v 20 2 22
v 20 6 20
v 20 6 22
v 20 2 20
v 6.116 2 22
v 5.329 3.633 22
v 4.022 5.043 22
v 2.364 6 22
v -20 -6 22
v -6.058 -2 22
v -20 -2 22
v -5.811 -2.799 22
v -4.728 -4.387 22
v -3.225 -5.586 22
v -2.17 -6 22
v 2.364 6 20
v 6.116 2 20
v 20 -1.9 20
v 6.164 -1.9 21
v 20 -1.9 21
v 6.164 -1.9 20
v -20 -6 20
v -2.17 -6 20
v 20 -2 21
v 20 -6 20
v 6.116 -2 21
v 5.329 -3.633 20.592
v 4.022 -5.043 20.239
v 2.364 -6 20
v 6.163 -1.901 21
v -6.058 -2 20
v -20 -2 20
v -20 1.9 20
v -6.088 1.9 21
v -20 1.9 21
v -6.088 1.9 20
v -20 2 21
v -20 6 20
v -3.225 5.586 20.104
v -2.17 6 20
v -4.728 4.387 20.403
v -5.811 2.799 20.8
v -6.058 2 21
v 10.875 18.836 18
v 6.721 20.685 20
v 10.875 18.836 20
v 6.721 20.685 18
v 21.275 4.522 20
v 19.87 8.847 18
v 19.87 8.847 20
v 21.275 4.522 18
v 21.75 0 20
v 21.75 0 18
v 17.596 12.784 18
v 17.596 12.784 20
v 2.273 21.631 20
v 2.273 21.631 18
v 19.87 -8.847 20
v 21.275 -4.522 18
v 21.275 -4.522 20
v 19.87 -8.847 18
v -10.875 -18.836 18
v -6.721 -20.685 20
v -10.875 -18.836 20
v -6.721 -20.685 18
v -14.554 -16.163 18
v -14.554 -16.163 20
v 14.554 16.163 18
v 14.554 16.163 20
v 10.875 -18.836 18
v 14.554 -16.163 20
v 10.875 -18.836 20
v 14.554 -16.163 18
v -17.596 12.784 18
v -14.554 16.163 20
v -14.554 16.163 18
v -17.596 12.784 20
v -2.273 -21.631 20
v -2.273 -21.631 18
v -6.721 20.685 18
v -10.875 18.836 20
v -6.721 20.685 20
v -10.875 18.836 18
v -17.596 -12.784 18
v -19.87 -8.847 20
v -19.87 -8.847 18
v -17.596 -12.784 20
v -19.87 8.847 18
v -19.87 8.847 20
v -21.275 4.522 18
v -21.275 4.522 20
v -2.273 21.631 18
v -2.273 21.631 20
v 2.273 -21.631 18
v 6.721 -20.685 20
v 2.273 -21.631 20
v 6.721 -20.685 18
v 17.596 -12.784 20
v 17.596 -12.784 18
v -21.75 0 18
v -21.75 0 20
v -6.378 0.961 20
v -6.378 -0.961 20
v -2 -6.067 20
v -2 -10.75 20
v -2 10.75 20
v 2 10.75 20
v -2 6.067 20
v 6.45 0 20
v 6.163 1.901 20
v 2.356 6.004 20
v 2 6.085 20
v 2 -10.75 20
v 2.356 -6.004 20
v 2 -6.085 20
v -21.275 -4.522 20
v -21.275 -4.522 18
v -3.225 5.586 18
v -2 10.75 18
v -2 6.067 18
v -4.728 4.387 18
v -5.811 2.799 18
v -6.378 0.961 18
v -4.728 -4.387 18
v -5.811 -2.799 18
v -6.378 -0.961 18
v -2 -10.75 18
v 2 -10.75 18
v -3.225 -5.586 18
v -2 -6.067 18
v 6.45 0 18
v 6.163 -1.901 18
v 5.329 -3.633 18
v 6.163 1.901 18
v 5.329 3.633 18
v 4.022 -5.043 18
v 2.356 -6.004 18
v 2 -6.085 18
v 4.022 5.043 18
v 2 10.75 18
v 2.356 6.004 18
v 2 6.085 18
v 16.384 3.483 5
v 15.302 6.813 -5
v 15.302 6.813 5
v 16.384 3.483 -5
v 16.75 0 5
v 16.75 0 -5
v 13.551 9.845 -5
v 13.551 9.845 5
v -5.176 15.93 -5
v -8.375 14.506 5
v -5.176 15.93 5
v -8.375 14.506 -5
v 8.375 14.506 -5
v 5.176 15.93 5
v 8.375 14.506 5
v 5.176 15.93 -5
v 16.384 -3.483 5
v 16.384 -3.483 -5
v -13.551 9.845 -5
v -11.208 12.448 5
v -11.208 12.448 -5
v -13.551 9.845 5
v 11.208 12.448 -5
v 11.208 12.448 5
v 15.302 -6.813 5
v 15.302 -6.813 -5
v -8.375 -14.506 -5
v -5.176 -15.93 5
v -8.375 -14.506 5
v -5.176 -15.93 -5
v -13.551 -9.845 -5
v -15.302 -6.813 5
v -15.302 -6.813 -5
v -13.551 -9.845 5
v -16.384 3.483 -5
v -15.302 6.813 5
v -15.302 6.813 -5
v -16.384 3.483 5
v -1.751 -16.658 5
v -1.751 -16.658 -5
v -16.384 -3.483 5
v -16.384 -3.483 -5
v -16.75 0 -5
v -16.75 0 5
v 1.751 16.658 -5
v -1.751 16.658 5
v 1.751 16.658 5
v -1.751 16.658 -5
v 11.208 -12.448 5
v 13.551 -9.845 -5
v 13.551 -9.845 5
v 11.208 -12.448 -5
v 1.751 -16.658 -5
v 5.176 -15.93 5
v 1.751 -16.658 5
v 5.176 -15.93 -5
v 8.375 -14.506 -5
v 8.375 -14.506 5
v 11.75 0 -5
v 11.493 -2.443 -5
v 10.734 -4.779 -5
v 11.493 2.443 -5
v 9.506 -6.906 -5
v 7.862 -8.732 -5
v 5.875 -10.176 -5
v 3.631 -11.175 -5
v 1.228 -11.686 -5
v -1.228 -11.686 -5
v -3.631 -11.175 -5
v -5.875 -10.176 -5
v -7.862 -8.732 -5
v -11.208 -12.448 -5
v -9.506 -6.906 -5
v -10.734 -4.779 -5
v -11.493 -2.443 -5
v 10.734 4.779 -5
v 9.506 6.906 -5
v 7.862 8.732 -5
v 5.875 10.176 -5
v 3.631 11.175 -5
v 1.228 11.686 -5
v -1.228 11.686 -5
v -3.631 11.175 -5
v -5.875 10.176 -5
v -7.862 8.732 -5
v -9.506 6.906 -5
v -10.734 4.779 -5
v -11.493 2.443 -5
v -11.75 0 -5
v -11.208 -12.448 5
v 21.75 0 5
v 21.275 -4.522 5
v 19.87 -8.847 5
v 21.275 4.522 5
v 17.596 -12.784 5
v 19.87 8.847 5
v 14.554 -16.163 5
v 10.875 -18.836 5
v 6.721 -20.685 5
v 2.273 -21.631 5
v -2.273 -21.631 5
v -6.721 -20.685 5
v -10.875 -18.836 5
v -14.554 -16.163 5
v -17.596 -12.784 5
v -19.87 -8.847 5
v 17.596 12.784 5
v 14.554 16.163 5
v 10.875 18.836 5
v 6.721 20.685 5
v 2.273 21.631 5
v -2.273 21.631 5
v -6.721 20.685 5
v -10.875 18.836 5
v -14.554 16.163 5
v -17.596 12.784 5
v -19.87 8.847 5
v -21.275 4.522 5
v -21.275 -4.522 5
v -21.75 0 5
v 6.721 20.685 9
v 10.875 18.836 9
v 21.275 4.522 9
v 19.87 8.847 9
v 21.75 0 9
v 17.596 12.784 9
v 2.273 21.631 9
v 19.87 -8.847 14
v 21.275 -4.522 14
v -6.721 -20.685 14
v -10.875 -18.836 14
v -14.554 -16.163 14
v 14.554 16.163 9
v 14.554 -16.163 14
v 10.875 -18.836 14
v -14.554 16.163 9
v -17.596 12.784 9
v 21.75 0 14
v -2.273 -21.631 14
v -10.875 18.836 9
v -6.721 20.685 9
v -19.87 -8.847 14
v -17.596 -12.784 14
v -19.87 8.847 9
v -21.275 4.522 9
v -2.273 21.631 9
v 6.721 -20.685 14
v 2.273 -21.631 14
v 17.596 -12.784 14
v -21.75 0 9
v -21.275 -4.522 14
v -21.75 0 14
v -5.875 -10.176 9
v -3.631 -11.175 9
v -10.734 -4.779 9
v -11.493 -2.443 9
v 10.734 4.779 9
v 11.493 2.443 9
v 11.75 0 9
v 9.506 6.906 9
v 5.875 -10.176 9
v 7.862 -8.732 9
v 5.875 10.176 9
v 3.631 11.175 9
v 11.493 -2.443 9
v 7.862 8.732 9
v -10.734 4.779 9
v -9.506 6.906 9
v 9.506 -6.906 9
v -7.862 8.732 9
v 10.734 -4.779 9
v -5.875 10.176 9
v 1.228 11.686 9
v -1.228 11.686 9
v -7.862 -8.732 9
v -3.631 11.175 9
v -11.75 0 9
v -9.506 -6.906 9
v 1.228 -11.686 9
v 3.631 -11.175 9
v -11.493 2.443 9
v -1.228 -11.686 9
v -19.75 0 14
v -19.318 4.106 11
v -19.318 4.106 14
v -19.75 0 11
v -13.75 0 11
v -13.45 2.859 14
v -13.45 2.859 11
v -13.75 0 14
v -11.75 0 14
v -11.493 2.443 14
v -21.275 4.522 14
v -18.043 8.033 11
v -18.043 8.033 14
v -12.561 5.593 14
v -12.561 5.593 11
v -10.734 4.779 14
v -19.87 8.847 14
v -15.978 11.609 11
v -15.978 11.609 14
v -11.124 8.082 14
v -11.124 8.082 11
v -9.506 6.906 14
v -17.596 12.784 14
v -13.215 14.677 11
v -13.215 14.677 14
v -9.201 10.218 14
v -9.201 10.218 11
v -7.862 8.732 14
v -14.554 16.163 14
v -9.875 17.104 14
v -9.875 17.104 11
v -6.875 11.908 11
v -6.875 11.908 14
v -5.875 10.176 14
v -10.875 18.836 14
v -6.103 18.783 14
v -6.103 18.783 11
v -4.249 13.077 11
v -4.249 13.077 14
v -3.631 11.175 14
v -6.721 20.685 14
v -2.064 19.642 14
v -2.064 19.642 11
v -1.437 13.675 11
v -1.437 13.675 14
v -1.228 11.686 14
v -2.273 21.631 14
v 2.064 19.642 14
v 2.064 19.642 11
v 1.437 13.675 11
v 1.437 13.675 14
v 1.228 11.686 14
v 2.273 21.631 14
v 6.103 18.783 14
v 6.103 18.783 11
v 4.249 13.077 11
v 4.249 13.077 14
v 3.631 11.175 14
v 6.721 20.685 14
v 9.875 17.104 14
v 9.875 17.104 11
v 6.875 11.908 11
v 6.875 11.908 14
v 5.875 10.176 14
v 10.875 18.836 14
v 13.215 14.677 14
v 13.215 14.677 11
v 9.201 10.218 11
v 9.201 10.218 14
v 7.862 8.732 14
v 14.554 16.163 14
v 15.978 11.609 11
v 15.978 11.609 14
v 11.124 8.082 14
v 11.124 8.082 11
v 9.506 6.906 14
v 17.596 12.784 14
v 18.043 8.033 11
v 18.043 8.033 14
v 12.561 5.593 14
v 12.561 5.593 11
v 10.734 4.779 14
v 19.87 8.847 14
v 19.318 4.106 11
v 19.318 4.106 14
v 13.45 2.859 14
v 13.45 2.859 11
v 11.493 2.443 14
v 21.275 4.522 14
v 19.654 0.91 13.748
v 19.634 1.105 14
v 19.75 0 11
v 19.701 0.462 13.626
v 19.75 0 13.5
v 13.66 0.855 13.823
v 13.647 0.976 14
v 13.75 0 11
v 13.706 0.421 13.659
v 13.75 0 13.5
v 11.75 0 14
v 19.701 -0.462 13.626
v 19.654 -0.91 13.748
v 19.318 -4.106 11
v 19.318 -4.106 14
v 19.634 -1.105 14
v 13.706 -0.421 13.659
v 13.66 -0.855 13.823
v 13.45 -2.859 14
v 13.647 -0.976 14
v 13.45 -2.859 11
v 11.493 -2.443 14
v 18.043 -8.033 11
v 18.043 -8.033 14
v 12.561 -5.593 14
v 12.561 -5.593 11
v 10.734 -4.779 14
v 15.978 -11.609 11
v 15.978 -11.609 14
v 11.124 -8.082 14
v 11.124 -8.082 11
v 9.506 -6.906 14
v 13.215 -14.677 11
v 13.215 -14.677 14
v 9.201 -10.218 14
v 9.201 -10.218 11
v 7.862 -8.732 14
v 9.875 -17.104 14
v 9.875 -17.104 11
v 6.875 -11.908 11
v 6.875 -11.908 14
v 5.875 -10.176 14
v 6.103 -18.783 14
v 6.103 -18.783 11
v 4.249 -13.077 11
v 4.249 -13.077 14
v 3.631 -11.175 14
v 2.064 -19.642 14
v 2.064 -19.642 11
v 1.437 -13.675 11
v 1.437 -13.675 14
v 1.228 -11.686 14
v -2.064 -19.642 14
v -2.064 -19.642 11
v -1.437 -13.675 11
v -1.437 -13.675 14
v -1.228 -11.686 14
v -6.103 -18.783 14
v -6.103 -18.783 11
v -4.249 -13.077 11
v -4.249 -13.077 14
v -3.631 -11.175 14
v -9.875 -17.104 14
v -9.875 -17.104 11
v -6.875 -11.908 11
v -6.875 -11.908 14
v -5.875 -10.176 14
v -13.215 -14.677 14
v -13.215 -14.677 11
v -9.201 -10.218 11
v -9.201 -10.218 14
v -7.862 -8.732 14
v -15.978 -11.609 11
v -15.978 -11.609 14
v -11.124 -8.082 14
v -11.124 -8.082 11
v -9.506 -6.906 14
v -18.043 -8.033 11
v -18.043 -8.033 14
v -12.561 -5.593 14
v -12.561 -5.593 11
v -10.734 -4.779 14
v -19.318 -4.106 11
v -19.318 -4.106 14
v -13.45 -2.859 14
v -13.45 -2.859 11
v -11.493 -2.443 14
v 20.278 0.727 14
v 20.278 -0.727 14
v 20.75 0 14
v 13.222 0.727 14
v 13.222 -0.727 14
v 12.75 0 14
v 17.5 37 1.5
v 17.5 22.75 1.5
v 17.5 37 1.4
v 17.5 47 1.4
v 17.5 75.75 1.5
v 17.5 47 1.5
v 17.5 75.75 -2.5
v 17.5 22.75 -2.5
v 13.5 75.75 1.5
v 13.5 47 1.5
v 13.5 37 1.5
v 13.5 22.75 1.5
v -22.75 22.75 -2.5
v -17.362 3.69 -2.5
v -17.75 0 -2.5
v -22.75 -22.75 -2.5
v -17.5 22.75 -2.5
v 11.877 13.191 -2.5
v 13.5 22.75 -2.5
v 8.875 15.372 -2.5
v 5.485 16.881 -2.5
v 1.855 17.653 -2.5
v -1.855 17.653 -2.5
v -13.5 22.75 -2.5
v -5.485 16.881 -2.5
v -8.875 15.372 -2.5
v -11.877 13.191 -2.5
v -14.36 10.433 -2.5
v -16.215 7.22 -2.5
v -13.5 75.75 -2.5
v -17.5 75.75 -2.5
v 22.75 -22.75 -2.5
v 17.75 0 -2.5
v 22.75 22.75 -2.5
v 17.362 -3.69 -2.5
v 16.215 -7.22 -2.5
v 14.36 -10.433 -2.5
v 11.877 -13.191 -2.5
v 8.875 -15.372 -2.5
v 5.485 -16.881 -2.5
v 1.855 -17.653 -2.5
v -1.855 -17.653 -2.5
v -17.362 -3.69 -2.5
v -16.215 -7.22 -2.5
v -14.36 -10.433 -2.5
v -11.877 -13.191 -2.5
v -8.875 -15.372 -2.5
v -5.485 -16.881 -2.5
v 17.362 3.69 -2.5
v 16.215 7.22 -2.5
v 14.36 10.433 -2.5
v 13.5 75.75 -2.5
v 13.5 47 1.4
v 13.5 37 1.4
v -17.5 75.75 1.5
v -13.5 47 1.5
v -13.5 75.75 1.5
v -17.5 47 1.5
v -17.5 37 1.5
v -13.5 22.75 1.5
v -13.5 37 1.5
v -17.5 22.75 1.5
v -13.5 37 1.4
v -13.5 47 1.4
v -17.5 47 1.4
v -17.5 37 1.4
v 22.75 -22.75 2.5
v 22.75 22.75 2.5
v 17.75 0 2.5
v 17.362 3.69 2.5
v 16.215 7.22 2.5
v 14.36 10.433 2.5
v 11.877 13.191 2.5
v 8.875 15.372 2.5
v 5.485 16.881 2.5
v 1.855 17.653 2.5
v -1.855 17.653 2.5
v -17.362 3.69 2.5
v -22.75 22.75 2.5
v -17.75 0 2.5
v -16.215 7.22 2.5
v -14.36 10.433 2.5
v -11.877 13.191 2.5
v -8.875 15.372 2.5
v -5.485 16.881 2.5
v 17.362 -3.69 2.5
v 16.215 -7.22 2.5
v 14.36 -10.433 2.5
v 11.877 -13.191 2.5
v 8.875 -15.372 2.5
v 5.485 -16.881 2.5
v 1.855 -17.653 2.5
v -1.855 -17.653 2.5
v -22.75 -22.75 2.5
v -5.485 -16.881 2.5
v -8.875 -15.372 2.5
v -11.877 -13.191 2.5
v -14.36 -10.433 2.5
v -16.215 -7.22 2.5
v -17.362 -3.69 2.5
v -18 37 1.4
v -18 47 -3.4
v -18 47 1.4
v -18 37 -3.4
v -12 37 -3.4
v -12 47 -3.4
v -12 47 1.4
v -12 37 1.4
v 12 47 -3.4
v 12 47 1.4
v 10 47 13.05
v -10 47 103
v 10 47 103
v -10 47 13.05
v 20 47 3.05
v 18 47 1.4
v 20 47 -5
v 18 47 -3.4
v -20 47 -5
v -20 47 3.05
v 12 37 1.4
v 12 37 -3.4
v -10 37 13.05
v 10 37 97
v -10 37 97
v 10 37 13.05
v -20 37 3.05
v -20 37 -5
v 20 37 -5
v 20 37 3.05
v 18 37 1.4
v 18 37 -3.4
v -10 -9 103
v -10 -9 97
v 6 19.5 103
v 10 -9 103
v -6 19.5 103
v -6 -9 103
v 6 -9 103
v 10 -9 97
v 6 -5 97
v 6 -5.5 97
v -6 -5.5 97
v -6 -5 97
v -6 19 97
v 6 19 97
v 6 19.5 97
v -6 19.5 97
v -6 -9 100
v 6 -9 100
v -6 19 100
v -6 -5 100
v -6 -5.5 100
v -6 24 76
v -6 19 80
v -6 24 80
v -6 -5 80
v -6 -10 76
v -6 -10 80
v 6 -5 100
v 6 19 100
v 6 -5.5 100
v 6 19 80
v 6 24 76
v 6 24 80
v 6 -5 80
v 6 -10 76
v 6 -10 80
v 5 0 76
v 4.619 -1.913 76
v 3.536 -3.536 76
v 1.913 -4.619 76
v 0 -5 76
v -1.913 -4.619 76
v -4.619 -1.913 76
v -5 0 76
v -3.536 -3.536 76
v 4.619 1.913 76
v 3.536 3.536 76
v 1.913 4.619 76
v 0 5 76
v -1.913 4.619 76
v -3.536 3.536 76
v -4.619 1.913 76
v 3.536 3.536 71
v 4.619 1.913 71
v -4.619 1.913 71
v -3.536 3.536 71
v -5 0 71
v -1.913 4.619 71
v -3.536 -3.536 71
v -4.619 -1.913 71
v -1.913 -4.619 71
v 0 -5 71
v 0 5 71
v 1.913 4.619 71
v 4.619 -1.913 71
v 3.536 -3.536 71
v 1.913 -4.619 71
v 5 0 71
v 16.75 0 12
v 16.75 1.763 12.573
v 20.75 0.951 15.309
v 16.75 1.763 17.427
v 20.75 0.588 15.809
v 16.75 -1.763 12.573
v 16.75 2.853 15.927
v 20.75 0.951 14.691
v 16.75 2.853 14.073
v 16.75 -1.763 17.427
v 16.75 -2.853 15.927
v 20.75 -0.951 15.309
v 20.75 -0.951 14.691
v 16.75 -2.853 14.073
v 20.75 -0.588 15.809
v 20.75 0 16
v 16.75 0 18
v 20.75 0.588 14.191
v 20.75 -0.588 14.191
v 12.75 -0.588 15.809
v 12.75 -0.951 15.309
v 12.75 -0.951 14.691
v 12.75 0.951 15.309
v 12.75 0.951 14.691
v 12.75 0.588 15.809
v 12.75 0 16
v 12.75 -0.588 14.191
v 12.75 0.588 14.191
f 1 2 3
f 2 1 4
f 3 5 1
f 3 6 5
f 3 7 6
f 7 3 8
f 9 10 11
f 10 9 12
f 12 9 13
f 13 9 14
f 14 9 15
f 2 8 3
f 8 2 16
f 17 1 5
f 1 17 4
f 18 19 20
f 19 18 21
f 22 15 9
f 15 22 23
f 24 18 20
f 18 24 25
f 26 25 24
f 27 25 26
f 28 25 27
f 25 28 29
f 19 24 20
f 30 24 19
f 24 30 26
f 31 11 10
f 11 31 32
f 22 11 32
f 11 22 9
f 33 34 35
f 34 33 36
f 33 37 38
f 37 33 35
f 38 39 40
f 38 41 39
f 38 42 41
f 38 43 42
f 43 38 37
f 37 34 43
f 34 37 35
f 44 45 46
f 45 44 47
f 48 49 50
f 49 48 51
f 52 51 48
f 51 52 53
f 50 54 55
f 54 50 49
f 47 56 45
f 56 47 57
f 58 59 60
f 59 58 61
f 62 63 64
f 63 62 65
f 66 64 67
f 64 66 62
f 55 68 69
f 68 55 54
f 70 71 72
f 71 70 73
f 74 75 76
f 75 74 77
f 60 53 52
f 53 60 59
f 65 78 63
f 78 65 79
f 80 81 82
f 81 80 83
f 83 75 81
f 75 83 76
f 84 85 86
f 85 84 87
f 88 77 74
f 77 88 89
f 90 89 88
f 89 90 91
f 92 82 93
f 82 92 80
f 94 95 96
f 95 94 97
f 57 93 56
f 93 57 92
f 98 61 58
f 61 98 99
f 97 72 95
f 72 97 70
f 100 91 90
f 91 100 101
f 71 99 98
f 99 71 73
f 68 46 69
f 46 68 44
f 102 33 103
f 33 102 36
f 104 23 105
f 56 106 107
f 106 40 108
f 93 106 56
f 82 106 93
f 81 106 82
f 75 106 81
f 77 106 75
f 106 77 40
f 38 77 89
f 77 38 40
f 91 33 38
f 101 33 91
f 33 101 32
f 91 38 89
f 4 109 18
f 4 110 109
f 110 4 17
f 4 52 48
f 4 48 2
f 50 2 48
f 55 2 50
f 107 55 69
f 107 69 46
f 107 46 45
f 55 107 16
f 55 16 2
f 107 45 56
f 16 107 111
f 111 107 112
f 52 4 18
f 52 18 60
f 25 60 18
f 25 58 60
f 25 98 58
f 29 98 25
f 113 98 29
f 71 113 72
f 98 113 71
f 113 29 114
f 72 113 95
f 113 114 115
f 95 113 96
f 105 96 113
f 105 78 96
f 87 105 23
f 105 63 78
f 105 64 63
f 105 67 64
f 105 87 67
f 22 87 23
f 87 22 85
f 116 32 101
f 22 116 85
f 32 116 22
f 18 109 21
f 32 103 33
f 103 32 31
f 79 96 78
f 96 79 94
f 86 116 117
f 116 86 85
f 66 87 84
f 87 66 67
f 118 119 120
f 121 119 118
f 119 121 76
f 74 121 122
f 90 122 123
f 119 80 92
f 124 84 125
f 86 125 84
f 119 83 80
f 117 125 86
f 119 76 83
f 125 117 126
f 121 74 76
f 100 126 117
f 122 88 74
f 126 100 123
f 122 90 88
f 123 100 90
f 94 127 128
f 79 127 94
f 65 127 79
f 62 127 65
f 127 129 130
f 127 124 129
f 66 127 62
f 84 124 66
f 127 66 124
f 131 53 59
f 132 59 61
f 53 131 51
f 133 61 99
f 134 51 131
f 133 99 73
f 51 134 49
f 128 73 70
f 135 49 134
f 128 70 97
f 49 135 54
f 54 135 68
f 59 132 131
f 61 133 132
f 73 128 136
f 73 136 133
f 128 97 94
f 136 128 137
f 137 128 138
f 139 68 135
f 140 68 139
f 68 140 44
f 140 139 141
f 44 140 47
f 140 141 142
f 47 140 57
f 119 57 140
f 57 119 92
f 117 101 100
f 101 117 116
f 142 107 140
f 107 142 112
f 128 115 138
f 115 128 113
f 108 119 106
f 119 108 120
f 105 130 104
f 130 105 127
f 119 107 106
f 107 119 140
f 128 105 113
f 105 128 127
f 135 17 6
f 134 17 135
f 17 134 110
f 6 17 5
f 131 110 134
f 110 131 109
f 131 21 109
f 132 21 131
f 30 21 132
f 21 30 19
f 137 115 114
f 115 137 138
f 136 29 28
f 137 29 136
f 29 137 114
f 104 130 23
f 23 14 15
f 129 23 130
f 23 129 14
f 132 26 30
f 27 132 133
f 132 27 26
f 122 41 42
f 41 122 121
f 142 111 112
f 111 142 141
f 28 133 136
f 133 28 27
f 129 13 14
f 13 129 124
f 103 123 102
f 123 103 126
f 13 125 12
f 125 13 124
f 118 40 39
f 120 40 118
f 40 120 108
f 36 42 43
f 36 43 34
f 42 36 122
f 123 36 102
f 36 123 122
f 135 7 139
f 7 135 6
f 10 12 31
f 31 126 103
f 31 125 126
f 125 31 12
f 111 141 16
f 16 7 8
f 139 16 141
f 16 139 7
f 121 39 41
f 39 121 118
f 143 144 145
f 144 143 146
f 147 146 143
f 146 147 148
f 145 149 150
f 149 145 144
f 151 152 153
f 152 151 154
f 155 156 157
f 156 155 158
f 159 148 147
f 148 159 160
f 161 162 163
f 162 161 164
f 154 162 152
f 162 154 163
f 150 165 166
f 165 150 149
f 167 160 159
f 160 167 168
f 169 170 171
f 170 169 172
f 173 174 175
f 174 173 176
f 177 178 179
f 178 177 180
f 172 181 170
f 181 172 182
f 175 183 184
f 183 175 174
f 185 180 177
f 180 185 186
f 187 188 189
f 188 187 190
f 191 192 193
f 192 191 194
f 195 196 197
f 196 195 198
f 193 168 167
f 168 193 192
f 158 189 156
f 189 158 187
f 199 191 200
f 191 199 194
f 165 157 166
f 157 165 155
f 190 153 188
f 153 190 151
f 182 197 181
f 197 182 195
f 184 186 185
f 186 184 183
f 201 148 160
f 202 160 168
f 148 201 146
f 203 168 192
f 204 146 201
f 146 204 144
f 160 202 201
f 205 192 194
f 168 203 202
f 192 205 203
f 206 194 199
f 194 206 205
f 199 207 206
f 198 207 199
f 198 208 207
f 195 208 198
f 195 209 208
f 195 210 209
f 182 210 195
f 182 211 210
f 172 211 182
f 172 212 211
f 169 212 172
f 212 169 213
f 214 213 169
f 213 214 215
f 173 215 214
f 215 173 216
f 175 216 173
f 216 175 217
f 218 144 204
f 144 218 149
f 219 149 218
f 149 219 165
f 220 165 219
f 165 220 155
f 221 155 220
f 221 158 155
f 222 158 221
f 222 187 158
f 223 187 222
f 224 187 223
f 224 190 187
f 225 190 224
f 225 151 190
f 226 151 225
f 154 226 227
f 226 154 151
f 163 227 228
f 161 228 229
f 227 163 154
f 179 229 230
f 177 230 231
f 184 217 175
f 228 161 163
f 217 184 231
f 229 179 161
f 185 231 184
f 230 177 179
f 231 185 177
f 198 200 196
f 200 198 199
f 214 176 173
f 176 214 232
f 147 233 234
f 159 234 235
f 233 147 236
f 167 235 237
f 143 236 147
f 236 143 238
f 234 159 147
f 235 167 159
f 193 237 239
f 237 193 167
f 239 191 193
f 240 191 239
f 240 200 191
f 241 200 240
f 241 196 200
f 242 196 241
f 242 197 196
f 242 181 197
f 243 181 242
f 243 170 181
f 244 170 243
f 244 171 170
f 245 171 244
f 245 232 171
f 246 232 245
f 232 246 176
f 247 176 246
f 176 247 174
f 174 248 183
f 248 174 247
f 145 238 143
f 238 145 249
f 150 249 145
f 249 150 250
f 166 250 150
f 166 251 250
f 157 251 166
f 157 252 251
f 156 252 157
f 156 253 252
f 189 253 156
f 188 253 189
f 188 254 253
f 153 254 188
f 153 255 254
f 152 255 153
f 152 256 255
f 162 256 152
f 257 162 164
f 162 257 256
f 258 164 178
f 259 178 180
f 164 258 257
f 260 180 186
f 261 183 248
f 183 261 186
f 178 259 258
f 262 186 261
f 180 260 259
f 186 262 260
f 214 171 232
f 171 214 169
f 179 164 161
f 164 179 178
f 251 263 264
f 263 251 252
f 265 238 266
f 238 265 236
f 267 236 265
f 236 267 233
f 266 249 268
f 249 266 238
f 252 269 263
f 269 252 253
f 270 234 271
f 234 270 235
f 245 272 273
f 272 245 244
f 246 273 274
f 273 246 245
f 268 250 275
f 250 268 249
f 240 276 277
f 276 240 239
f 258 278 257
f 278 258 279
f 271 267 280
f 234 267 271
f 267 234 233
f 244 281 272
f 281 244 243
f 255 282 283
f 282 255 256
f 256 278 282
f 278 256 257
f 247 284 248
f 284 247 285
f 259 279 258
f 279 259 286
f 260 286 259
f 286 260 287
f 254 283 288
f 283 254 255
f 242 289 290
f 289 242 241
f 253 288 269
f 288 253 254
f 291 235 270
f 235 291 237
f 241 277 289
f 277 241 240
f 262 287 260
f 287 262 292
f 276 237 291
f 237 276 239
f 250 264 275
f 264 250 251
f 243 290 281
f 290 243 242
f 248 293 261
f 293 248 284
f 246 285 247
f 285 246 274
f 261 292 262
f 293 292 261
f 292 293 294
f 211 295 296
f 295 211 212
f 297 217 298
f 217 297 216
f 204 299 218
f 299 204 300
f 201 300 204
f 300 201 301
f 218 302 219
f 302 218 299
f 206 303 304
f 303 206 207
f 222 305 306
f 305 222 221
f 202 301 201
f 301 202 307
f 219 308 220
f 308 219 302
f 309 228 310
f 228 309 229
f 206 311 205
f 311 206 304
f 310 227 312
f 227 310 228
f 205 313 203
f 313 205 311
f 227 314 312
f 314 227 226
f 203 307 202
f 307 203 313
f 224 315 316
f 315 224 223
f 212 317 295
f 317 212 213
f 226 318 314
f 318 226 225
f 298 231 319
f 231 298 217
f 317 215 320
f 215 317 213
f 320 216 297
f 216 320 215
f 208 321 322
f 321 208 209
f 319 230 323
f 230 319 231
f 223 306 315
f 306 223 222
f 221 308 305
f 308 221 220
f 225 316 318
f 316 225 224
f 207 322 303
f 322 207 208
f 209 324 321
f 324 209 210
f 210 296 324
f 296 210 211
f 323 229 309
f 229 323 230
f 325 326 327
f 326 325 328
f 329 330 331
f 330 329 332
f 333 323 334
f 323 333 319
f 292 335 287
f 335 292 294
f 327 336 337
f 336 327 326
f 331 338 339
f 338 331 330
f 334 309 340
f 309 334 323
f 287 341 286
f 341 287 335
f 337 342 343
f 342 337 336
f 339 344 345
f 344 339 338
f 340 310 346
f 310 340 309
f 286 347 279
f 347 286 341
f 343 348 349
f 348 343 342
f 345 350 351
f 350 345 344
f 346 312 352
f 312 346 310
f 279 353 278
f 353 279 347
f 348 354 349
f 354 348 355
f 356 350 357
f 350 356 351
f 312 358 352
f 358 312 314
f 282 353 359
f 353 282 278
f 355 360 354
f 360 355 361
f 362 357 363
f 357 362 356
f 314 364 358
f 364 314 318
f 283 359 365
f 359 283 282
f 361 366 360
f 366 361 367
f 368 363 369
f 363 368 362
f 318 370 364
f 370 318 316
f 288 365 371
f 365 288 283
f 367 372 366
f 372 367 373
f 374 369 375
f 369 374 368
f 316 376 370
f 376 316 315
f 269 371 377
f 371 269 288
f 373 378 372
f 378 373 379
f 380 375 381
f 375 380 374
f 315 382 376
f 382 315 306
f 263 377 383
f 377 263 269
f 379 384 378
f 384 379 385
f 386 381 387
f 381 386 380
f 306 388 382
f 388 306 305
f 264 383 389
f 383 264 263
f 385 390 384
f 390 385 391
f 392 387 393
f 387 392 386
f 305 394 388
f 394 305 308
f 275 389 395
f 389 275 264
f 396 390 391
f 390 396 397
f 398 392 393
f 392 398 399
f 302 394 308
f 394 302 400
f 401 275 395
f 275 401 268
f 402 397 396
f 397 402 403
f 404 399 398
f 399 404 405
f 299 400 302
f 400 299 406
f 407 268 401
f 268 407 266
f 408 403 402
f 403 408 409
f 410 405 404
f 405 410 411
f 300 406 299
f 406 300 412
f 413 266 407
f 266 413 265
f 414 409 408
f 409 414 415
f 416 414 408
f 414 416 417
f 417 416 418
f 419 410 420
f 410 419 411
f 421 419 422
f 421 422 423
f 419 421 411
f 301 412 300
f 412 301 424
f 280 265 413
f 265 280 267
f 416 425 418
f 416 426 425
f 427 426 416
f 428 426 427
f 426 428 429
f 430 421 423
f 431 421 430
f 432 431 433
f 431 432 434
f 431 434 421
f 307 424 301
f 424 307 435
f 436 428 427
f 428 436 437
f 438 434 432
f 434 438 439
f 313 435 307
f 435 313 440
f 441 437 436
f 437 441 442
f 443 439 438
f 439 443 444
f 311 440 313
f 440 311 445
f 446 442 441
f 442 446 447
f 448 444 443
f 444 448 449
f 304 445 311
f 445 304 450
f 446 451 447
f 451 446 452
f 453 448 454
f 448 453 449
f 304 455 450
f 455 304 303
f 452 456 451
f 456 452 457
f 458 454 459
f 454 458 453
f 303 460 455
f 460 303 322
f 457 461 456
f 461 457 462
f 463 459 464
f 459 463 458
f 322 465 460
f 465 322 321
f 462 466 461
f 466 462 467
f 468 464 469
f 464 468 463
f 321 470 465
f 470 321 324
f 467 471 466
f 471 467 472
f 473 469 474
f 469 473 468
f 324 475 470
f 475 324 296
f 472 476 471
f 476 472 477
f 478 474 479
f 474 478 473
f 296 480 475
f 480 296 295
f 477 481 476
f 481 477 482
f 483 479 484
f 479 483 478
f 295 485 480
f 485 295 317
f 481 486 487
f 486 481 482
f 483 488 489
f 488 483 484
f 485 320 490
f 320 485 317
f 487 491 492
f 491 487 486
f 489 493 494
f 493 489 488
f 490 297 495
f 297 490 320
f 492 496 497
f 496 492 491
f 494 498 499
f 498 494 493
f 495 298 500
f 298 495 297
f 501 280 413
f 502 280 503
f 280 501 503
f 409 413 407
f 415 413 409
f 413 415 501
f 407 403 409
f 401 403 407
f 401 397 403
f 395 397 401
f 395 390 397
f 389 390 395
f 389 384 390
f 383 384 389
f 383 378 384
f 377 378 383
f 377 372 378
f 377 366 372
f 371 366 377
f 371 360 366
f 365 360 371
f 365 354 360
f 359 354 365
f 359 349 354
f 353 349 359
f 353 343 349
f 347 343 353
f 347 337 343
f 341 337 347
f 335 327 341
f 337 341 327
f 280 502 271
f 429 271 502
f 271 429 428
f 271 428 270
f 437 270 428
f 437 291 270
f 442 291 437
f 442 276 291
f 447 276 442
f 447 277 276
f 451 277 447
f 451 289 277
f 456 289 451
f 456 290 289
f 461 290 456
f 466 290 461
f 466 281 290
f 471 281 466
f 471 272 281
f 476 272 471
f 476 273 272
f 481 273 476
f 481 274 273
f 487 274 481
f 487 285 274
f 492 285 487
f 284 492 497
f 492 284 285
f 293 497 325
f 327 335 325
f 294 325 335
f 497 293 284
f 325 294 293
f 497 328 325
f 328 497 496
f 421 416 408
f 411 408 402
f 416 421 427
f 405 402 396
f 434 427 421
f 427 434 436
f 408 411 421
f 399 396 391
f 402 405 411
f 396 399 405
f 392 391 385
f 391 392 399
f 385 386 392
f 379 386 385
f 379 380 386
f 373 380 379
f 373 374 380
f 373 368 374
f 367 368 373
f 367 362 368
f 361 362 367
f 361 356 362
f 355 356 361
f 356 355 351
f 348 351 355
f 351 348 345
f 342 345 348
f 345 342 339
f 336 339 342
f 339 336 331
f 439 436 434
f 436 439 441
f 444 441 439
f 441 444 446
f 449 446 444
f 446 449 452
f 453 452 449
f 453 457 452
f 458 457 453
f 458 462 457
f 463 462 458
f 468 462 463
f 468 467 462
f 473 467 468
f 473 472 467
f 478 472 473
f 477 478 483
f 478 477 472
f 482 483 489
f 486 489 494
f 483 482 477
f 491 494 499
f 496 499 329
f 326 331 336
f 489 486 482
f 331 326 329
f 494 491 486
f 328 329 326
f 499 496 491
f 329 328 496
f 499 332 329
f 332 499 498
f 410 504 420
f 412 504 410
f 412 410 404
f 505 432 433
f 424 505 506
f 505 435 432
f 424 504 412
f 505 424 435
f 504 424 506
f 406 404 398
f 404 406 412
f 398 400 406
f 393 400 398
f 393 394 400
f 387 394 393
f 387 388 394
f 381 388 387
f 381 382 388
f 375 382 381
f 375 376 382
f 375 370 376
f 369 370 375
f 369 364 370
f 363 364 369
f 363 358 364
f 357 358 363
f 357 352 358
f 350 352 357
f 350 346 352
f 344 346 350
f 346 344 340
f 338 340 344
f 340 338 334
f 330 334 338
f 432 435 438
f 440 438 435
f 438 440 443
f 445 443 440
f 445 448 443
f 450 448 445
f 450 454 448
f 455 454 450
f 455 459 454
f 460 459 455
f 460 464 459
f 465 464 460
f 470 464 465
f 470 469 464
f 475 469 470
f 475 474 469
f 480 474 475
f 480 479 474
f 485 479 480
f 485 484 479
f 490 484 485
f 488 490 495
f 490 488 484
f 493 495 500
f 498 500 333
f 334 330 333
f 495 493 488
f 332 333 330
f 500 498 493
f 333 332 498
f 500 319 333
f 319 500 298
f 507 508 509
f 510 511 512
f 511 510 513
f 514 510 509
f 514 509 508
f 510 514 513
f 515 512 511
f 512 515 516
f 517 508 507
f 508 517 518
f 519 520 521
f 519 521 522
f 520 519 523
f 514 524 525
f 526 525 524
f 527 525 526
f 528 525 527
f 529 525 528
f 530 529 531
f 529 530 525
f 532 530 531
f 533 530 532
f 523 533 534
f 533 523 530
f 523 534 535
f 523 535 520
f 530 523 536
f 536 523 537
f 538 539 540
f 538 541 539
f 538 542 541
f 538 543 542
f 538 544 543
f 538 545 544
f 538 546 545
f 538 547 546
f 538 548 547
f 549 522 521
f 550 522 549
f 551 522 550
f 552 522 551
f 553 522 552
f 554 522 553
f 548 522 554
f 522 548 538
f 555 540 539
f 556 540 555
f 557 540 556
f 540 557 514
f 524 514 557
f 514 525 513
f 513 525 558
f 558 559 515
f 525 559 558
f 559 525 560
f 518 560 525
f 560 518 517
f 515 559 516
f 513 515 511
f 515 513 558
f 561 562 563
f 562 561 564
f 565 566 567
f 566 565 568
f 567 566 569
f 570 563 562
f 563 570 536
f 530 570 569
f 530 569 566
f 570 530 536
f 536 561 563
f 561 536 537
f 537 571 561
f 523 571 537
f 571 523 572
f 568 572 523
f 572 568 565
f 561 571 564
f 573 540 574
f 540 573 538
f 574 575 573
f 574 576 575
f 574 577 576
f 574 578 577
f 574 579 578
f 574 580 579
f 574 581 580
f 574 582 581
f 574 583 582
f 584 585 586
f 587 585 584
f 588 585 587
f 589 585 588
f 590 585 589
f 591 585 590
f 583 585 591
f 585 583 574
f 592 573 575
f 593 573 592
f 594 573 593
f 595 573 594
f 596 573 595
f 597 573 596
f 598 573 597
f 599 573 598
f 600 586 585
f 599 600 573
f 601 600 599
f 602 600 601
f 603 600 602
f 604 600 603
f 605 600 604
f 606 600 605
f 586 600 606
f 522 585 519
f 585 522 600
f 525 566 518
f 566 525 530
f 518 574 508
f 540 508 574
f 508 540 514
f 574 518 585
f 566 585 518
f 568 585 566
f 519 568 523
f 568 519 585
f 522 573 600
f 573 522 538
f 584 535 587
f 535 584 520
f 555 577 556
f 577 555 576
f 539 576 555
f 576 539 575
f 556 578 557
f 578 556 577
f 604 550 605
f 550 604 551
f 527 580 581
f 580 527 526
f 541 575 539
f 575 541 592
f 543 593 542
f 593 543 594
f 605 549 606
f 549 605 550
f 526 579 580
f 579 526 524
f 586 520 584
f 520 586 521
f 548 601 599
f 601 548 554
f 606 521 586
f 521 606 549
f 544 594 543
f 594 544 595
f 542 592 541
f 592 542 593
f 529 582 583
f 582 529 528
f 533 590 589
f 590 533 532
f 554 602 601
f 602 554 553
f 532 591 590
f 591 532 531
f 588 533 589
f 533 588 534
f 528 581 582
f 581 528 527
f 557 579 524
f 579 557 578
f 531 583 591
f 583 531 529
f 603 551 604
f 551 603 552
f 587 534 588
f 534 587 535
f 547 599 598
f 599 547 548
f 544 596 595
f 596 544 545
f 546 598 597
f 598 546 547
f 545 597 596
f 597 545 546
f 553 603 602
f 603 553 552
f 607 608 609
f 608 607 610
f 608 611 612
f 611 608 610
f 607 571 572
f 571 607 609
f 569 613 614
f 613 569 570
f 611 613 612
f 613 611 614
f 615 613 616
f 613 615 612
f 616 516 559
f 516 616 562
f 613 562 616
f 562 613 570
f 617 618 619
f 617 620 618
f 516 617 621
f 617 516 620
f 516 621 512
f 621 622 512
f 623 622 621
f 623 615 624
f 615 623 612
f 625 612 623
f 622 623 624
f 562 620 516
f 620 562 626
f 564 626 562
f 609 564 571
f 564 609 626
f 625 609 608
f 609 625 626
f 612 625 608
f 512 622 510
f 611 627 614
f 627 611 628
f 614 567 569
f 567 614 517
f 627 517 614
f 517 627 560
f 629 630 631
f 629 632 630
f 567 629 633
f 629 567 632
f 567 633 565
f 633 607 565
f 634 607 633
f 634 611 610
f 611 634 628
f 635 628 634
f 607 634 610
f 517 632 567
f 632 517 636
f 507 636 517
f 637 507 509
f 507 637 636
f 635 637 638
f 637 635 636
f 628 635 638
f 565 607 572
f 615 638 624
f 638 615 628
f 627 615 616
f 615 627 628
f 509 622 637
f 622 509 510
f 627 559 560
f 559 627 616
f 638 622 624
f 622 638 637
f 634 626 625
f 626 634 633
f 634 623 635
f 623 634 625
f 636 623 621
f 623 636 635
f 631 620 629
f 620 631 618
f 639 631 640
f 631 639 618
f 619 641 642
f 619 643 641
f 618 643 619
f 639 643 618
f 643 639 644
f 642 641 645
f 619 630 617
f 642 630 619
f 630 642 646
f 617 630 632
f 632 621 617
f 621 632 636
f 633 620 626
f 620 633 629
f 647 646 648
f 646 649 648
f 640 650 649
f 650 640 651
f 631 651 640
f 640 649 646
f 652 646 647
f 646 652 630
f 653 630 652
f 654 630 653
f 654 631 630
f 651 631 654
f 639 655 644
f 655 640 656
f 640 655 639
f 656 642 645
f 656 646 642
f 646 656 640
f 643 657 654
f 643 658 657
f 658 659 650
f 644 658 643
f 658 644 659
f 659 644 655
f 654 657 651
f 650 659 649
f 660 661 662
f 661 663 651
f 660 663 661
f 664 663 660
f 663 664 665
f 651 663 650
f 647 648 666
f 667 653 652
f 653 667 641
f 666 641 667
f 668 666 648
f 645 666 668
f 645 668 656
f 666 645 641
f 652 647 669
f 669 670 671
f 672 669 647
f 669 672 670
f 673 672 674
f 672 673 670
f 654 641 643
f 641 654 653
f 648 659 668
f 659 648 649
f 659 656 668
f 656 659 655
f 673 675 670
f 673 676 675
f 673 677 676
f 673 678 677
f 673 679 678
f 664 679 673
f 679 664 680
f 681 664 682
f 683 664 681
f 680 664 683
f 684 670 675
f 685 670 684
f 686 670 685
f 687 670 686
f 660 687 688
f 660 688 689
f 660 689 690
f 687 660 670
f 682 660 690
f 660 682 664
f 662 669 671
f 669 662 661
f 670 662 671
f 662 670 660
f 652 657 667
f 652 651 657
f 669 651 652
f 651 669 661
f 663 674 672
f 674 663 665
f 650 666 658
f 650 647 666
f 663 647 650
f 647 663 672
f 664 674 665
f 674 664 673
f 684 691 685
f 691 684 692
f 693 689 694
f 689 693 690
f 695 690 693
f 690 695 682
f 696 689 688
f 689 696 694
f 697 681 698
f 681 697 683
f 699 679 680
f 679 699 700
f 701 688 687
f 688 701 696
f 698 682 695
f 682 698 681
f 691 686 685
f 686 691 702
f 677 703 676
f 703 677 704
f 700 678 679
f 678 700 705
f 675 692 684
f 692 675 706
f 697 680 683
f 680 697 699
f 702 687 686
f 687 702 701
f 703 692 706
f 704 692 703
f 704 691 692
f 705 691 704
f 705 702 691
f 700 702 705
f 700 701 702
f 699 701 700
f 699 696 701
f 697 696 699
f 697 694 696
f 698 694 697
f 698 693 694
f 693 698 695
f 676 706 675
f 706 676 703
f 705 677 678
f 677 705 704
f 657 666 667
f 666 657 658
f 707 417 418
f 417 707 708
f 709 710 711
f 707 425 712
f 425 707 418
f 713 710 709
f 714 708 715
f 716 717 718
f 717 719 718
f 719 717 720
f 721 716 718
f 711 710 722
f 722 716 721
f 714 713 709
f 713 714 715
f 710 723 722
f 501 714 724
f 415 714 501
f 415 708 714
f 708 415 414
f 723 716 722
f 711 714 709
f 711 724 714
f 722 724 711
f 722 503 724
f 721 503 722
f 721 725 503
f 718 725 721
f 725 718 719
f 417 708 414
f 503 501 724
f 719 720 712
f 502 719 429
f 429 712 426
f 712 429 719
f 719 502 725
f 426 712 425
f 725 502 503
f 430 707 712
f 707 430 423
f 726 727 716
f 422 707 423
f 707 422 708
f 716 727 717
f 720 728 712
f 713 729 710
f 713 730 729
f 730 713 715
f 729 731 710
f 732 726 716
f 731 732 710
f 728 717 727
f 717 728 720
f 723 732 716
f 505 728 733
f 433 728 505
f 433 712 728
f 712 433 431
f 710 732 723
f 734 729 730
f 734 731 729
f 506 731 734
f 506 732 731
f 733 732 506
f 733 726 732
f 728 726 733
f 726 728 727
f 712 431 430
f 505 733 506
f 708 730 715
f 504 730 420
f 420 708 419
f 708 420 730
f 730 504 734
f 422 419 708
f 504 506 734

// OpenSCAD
// file: ball_bearing.scad
include <parameters.scad>

module ball_bearing(){
    rotate([0,90,0])
    cylinder(ball_bearing_length/2,ball_bearing_height ,true);
    rotate([0,90,180])
    cylinder(ball_bearing_length/2,ball_bearing_height ,true);
}

//%ball_bearing();
// file: servo.scad
//parameters
servo_width = 12;
servo_length = 24;
servo_height = 24;
ex_length = 5;
ex_height = 4;
shaft_radius = 5;
shaft_height = 5;
shaft_offset = -servo_length/2+shaft_radius;

module mirror_copy(vec=[0,1,0]){
    children();
    mirror(vec)children();
}

module back_holes(){
    mirror_copy([1,0,0])translate([top_component_width/2-round((top_component_width*0.1)/2)-3,0,0])
    cube([round(top_component_width*0.15),back_component_length,top_component_height*0.6], true);    
}

module servo(){
    translate([0,0,servo_height/2])
    union(){
        //extrusion
        mirror_copy()
            translate([0,servo_length/2+ex_length/2,(servo_height/2)-ex_height/2])
                cube([servo_width, ex_length, ex_height], true);
        //shaft
        translate([0,shaft_offset,servo_height/2+shaft_height/2])
        cylinder(shaft_height, shaft_radius, shaft_radius, true);
        //base
        cube([servo_width, servo_length, servo_height], true);
    }
}
// file: hangon_clickin.scad
include <servo.scad>
include <parameters.scad>

//%back_holes();

module hangon(){
    //support
    mirror_copy([1,0,0])translate([hangon_support_distance,-hangon_support_length/2-(contact_delta/2)+5,-(5-(top_component_height*0.5))/2])
    cube([round(top_component_width*0.1),hangon_support_length+contact_delta,top_component_height*0.5], true);

    //base
    translate([0,shaft_center,0])
    difference(){
        cube([hangon_base_diameter,hangon_base_diameter,5], true);
        cylinder(10, hangon_base_diameter/2-5, hangon_base_diameter/2-5, true);
    }
}
// file: base_clickin.scad
include <servo.scad>
include <parameters.scad>

module tower_base(){
    union(){
        //back tower
        union(){
            translate([0,back_offset,(back_component_height/2)-base_height/2])
            union(){
                //back holes
                translate([0,0,back_component_height/2+top_component_height/2])
                difference(){
                    cube([top_component_width,back_component_length,top_component_height], true);
                    back_holes();
                    
                }
                //back component
                cube([outer_width,back_component_length,back_component_height], true);
                //triangle supports
                hull(){
                    translate([0,0,back_component_height/2])
                    cube([top_component_width,back_component_length,0.1], true);
                    translate([0,0,back_component_height/2-10])
                    cube([outer_width,back_component_length,0.1], true);
                }
            }
        }
        //base
        difference(){
            difference(){
                cube([outer_width,outer_length,base_height], true);
                translate([0,-front_offset,0])
                cube([inner_width,inner_length,base_height], true);
            }
            translate([0,-outer_length/2+2,-2])
            cube([inner_width,4,4], true);
        }
    }
}

//tower_base();
//translate([0,-front_offset,0])
//  %servo();
// file: bearing_disc.scad
include <parameters.scad>
include <bearing_holder.scad>

/*
translate([0,-shaft_center,0])
bearing_holder();
*/

module bearing_disc(){
    translate([0, 0, holder_height+bearing_pit_height+disc_height/2])
    union(){
        difference(){
            union(){
                //lock high 1
                translate([0,hole_width/2,0])
                cube([20,4,disc_height+1]);
                //lock low 1
                hull(){
                    translate([0,-hole_width*1.5,0])
                    cube([20,0.1,disc_height-1]);
                    translate([0,-hole_width/2,0])
                    cube([20,0.1,disc_height]);
                }
                //lock high 2
                rotate([0,0,180])
                translate([0,hole_width/2,0])
                cube([20,4,disc_height+1]);
                //lock low 2
                rotate([0,0,180])
                hull(){
                    translate([0,-hole_width*1.5,0])
                    cube([20,0.1,disc_height-1]);
                    translate([0,-hole_width/2,0])
                    cube([20,0.1,disc_height]);
                }
                //disc
                cylinder(disc_height,disc_radius,disc_radius, true);
            }
            //lock hole
            cube([hole_width,hole_length,disc_height], true);
             //shaft hole
            cylinder(disc_height+4, shaft_raidus, shaft_raidus, true);
        }
    }
}
// file: bearing_holder.scad
include <servo.scad>
include <parameters.scad>
include <hangon_clickin.scad>

//%hangon();

module bearing_holder(){
    translate([0,shaft_center,0])
    union(){
        difference(){
            //base
            union(){
                //holder
                cylinder(holder_height, holder_width, holder_width, true);
                //bearing pit base
                translate([0,0,holder_height/2+bearing_pit_height/2])
                cylinder(bearing_pit_height, bearing_pit_width, bearing_pit_width, true);
            }
            //shaft hole
            translate([0,0,bearing_pit_height/2])
            cylinder(holder_height+bearing_pit_height, shaft_hole_radius, shaft_hole_radius, true);
        }
    }
    //bearing pit
    translate([0,shaft_center,-(shaft_hole_radius-(holder_height/2+bearing_pit_height))])
    rotate_extrude(angle = 360, convexity = 10){
        polygon(points=[[shaft_hole_radius,shaft_hole_radius], [shaft_hole_radius+pit_width, shaft_hole_radius], [shaft_hole_radius+pit_width, shaft_hole_radius+wall_height], [shaft_hole_radius+pit_width-wall_width,shaft_hole_radius+wall_height], [shaft_hole_radius+pit_width-wall_width,shaft_hole_radius+wall_width], [shaft_hole_radius+wall_width,shaft_hole_radius+wall_width], [shaft_hole_radius+wall_width,shaft_hole_radius+wall_height], [shaft_hole_radius,shaft_hole_radius+wall_height]]);
    };
}

//bearing_holder();
// file: parameters.scad
//parameters

//base
back_length = 10;
outer_width = 20;
outer_length = 36+back_length;
inner_width = 12;
inner_length = 25;
base_height = 6;
front_offset = round((outer_length-inner_length)/2)-4;
back_component_length = 10;
back_component_height = 100;
back_offset = outer_length/2+back_component_length/2;
top_component_height = 8;
top_component_width = 40;

//hangon
contact_delta = 50;
hangon_support_length = 8;
hangon_support_delta = 2.5;
hangon_support_distance = (top_component_width/2-round((top_component_width*0.1)/2)-hangon_support_delta);
shaft_center = (-hangon_support_length-((hangon_support_distance+10)/2))-contact_delta;
hangon_base_diameter = hangon_support_distance+30;

//fixture
top_part_diplacement = 8;
leg_width = 2;
clickon_height = 2;

//bearing_pit
shaft_hole_width = hangon_base_diameter/2-5;
holder_width = shaft_hole_width-1;
holder_height = 10;
bearing_pit_width = holder_width+5;
bearing_pit_height = 4;
shaft_hole_radius = holder_width-5;
wall_width = 2;
wall_height = 5;
pit_width = 10;

//bearing_disc
disc_radius = shaft_hole_radius+pit_width;
disc_height = 2;
hole_length = (shaft_hole_radius*2)-2;
hole_width = 4;
shaft_raidus = (hole_length/2)*0.6;

//servo
servo_width = 12;
servo_length = 24;
servo_height = 24;
ex_length = 5;
ex_height = 4;
shaft_radius = 5;
shaft_height = 5;
shaft_offset = -servo_length/2+shaft_radius;

//ball bearings
ball_bearing_length = 8;
ball_bearing_height = 3;

//shaft
shaft_girth = shaft_raidus-(0.5/2);
shaft_pole_height = 60;
shaft_grip_height = 5;
shaft_fitting = 4;
pole_up_trans = back_component_height/2-(servo_height/2+shaft_height/2)+((servo_height+shaft_height)-shaft_pole_height/2)+shaft_fitting;
lock_ex_width = hole_width*0.8;
lock_ex_length = hole_length-0.5;
lock_ex_displacement = -17.6;



//complete 
bearing_delta = 4;
center_on_shaft = front_offset-shaft_offset;
// main file
include <parameters.scad>
include <bearing_holder.scad>
include <bearing_disc.scad>
include <base_clickin.scad>
include <hangon_clickin.scad>
include <servo.scad>
include <ball_bearing.scad>


translate([0,0,bearing_delta])
bearing_disc();
translate([0,-shaft_center,0])
bearing_holder();
translate([0,-shaft_center,0])
hangon();

//tower base and servo
rotate([0,180,0])   
translate([0,center_on_shaft,-back_component_height])
union(){
    tower_base();
    translate([0,-front_offset,0])
    servo();
}

translate([shaft_hole_radius+pit_width/2,0,holder_height+wall_height])
ball_bearing();
